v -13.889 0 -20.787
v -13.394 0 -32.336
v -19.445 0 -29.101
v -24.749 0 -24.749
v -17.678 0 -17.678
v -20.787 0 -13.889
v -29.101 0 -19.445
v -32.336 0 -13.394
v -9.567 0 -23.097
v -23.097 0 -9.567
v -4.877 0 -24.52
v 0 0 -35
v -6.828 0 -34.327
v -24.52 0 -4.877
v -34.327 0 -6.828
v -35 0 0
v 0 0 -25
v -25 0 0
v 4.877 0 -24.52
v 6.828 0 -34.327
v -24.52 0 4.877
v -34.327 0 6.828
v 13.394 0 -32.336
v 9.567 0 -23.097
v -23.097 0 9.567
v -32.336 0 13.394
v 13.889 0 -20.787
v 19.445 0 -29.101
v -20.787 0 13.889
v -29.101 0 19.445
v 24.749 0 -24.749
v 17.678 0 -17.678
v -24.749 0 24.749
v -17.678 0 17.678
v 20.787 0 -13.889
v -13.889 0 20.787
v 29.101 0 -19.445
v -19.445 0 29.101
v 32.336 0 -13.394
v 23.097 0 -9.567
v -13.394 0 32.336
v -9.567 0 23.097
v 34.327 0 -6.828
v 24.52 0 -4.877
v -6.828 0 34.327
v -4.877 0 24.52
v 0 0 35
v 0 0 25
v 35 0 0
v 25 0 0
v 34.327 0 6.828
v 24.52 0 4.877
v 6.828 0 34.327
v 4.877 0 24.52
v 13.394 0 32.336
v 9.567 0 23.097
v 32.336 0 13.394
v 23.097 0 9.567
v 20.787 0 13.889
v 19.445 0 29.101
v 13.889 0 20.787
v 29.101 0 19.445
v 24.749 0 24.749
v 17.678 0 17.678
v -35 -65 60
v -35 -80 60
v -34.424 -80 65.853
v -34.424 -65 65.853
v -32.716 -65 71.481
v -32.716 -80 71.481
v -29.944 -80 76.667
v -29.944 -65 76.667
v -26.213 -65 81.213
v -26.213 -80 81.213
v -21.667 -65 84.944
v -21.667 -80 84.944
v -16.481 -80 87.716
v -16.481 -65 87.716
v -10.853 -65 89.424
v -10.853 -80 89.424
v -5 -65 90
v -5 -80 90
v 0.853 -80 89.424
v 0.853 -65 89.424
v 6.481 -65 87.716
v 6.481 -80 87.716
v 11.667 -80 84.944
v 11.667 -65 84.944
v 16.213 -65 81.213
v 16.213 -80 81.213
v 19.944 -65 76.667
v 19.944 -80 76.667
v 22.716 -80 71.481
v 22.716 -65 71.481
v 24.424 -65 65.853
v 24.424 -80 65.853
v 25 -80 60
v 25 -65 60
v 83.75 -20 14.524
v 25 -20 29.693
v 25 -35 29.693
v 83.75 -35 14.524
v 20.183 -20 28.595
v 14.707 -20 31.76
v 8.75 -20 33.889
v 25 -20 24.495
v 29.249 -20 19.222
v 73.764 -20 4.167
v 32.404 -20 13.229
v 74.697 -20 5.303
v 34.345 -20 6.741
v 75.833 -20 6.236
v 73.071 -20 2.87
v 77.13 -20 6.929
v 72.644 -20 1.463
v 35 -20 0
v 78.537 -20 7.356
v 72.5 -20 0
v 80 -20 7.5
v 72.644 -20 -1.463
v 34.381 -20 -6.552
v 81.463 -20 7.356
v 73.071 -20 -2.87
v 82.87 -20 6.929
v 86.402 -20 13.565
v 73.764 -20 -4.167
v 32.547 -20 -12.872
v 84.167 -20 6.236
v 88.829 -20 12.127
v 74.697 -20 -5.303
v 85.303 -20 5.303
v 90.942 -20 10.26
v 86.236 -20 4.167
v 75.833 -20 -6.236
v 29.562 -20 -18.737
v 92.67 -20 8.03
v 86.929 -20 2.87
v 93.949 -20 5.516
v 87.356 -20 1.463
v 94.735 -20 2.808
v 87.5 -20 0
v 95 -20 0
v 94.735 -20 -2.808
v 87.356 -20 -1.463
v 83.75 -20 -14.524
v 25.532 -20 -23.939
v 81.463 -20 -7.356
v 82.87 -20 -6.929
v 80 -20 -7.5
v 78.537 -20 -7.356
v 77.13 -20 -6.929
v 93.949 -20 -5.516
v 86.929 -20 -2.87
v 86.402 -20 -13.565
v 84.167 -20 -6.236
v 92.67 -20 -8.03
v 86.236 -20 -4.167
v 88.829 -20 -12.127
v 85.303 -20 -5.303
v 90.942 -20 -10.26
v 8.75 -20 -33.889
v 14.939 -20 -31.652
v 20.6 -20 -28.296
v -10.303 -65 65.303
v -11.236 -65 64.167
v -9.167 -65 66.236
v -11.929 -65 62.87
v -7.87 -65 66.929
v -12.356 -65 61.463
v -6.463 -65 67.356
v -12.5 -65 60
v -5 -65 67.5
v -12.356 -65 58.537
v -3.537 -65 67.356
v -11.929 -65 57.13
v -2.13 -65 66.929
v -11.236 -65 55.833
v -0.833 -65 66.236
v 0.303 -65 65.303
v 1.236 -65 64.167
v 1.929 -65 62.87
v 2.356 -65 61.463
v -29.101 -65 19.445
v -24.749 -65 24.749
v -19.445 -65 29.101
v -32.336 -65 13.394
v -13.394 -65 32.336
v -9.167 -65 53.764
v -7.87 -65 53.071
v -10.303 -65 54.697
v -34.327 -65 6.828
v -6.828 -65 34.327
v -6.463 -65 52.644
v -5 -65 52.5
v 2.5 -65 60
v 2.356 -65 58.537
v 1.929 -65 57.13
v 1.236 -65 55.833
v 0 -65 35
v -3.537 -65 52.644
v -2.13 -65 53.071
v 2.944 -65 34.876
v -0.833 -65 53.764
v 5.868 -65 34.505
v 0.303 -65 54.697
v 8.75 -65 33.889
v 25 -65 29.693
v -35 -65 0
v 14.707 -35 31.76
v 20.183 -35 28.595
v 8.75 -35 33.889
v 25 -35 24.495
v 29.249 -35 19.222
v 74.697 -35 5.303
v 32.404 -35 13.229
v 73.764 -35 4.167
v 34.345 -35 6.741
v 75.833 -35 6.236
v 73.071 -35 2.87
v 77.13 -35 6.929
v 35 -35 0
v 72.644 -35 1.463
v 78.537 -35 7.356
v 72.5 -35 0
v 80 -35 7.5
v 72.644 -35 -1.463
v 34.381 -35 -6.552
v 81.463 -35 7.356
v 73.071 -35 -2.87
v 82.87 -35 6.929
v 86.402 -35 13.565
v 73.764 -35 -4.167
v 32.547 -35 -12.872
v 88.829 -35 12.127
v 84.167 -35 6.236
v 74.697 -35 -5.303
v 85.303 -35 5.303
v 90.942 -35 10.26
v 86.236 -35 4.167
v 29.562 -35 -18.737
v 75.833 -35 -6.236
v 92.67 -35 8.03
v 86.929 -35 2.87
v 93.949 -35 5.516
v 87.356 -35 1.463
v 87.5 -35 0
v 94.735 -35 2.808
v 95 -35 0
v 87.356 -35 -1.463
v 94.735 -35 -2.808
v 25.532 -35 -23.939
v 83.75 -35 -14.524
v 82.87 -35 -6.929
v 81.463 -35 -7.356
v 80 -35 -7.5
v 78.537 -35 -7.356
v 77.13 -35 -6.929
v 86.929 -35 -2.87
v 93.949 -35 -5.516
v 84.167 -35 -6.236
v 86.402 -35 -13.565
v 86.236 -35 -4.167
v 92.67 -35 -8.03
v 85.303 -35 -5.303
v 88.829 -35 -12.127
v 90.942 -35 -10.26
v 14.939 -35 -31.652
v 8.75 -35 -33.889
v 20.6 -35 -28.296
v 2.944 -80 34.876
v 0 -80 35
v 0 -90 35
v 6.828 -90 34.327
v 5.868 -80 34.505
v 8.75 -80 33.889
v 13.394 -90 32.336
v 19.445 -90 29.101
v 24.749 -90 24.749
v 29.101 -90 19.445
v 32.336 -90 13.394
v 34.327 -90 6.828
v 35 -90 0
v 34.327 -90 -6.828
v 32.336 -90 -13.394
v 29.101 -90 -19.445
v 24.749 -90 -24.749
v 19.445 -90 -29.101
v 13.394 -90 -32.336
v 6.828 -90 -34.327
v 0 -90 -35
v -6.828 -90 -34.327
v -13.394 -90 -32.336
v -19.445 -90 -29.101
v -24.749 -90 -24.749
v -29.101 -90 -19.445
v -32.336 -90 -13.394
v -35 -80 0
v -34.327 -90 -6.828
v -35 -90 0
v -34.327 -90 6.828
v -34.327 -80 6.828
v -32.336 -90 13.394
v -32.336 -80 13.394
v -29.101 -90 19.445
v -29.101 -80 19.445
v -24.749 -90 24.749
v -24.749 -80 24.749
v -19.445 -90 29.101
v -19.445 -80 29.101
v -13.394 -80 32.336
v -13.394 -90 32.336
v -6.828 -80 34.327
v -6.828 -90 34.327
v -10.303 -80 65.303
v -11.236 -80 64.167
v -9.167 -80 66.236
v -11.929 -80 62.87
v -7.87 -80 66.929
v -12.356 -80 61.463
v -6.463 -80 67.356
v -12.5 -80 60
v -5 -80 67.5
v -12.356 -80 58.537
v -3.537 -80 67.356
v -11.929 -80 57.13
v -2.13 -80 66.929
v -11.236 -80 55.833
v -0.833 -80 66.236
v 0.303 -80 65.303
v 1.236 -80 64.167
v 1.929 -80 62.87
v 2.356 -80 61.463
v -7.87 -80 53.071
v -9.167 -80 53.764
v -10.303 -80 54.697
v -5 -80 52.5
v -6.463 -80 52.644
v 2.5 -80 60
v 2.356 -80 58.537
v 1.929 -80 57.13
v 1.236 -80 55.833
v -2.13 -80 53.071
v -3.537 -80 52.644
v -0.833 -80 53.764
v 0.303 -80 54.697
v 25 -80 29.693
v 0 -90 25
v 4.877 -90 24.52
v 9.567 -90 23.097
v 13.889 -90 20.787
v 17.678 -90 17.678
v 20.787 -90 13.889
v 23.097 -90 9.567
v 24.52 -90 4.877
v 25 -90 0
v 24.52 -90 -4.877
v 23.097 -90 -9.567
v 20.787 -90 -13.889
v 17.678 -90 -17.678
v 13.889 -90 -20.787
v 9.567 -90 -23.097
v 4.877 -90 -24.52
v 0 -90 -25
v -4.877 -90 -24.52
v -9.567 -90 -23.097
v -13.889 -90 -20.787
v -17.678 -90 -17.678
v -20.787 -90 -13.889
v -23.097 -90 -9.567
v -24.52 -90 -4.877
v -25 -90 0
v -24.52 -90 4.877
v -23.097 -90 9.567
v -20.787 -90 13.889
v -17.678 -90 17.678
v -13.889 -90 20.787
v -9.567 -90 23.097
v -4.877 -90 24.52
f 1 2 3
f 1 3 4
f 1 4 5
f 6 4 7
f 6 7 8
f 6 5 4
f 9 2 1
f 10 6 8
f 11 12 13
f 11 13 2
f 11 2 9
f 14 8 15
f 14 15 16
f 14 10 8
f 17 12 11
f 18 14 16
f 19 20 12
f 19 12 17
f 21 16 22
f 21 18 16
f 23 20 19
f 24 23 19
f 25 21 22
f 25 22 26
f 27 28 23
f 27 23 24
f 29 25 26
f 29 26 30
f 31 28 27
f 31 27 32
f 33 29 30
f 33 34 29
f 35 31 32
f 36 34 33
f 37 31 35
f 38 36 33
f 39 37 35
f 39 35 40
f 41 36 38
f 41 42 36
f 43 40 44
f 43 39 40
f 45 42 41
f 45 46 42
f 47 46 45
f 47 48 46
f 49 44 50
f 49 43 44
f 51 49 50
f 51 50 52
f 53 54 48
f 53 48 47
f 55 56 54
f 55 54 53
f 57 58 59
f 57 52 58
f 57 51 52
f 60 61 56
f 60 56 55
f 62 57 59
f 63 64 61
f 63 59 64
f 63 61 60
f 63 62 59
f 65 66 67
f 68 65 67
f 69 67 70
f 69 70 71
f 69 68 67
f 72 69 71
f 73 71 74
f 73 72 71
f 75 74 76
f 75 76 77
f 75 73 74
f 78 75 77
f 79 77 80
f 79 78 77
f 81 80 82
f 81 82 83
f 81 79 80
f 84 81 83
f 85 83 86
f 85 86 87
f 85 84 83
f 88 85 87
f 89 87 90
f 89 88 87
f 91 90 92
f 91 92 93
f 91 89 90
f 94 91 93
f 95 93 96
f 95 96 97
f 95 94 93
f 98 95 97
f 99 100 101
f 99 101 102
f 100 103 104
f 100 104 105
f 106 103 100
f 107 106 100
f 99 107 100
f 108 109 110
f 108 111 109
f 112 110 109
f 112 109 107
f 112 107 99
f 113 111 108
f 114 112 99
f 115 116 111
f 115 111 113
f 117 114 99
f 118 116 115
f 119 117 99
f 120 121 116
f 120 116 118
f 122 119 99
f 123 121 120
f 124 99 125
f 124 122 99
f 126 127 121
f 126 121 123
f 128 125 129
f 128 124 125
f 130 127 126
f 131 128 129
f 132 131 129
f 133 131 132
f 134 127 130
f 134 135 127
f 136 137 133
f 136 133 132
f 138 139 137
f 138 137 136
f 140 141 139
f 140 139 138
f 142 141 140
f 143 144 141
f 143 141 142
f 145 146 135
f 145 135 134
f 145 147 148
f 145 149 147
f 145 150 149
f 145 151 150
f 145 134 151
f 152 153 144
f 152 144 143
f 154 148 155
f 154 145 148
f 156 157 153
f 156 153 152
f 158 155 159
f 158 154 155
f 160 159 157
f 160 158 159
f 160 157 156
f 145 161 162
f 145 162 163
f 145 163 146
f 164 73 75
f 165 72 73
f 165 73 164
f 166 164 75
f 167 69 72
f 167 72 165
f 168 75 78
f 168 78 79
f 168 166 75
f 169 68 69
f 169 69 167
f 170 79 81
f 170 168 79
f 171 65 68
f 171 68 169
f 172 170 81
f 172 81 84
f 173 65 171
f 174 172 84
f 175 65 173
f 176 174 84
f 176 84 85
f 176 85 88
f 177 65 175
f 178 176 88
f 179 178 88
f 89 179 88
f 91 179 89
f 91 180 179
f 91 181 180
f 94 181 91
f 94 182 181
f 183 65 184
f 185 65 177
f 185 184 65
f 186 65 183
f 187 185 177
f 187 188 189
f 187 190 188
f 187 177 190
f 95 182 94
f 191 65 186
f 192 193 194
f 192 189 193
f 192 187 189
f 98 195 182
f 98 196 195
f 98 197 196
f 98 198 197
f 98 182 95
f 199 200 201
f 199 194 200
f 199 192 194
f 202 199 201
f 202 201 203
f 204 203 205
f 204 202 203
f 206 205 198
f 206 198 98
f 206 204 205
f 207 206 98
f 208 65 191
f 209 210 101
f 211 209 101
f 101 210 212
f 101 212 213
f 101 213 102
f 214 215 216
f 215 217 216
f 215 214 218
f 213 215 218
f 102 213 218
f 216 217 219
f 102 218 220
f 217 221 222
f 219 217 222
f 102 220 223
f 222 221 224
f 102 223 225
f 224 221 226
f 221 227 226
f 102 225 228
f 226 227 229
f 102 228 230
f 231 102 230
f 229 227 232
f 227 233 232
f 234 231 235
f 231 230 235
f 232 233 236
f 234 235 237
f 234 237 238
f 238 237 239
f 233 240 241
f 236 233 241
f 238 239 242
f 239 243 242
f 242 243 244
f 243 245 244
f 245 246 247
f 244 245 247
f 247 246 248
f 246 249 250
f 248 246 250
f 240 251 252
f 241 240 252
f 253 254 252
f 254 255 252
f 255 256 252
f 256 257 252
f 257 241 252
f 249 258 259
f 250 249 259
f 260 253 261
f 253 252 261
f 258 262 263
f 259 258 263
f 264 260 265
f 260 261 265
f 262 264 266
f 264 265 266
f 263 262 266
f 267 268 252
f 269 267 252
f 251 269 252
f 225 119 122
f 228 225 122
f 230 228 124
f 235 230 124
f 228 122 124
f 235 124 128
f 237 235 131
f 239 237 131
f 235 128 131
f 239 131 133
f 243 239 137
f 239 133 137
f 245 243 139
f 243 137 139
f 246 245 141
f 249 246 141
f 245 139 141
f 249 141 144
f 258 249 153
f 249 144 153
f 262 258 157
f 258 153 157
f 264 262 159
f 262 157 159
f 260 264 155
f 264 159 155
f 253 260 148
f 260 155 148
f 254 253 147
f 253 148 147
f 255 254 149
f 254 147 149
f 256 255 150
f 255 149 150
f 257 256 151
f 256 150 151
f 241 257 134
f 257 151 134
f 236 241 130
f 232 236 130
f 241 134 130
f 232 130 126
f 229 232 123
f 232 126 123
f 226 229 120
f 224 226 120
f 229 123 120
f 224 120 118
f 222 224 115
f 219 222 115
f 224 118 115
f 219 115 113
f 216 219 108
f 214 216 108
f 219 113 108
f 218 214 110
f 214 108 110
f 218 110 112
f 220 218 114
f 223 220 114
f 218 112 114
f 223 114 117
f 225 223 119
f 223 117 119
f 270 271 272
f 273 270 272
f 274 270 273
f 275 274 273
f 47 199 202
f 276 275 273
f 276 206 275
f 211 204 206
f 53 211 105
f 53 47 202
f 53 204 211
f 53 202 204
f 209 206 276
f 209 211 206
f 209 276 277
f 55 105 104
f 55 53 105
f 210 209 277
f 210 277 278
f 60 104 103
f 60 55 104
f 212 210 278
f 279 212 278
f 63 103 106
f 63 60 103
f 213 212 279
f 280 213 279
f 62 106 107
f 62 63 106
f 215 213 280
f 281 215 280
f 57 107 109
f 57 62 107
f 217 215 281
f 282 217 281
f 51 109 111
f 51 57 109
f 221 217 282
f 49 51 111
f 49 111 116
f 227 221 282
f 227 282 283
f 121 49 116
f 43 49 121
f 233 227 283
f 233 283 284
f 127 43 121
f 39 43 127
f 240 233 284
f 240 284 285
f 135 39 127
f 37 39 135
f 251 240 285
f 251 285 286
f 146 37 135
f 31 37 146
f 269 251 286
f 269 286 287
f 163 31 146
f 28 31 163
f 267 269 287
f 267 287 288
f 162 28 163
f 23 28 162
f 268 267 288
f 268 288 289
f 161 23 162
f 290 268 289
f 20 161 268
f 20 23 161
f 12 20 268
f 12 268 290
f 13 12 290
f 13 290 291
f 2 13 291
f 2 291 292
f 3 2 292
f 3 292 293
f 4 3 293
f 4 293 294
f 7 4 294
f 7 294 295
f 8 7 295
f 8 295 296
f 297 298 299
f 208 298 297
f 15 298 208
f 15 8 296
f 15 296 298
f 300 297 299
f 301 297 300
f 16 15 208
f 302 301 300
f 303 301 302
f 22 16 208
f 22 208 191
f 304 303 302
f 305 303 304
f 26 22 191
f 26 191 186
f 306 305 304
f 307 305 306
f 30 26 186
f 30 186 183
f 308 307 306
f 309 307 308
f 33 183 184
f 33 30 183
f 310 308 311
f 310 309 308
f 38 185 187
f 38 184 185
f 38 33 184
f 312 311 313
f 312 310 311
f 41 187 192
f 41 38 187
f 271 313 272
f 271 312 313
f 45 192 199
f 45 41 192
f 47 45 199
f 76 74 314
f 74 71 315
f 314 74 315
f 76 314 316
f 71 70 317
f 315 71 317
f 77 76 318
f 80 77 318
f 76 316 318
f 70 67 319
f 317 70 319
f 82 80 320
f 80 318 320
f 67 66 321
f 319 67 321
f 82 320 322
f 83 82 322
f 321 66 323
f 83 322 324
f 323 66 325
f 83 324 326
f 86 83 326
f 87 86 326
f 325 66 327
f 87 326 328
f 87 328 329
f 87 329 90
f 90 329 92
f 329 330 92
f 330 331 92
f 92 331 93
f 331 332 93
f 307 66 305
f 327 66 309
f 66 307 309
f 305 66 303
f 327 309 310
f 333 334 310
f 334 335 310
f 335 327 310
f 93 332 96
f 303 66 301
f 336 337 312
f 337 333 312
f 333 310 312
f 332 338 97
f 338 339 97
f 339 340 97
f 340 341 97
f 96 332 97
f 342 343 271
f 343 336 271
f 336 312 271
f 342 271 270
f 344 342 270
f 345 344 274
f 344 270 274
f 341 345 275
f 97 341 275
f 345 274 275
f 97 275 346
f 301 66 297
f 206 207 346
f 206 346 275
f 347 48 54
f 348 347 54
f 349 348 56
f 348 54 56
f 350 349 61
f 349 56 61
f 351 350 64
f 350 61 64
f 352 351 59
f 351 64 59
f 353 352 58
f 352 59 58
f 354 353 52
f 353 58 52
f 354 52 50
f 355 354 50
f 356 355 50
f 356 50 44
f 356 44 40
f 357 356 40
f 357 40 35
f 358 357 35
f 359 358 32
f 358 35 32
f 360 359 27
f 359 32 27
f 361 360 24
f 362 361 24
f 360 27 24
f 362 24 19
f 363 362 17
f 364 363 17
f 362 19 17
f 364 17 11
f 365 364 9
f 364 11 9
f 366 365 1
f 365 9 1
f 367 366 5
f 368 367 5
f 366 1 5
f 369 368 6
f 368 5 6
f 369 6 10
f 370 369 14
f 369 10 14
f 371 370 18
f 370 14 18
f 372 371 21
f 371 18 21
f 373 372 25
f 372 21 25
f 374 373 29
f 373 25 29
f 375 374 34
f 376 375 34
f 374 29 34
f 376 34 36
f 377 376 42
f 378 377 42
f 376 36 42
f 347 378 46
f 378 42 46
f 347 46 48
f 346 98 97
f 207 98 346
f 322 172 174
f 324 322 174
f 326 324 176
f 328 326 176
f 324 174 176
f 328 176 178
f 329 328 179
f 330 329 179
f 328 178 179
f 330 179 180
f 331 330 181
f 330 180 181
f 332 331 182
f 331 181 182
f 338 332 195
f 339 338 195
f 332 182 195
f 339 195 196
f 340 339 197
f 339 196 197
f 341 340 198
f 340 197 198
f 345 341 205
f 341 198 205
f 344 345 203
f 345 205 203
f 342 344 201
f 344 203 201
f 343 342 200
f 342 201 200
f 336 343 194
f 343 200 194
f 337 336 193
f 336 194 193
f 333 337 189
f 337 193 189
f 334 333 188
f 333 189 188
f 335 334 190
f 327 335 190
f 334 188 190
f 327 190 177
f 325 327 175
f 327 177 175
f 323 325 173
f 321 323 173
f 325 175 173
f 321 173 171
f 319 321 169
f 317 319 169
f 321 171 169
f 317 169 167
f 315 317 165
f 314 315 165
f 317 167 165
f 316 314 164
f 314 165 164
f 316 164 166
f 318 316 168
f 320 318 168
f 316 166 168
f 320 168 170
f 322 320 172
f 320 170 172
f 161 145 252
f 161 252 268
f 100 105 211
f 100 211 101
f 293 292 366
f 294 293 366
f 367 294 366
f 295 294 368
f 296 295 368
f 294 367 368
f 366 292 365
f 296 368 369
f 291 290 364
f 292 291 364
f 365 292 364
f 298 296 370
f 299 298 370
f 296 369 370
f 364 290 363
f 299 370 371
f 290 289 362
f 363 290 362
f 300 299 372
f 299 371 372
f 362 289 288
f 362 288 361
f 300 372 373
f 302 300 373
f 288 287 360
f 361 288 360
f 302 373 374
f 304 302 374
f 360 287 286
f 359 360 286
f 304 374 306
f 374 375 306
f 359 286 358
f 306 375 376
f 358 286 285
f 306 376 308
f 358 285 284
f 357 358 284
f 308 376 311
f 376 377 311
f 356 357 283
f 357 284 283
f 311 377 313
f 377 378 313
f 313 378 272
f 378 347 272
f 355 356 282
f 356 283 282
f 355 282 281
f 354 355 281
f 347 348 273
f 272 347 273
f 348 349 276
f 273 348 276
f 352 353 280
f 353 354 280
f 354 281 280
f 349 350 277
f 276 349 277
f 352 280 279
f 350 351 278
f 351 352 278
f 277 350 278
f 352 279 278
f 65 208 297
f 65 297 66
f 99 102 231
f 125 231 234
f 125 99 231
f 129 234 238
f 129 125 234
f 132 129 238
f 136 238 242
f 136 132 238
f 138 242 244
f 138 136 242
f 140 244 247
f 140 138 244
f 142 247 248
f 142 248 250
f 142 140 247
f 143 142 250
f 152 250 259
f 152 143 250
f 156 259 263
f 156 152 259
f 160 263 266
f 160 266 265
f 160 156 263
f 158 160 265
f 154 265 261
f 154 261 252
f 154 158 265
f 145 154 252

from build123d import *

# Parameters (mm, degrees)
SKETCH1_R           = 25
BOSS_EXTRUDE1_DEPTH = 90
BOSS_EXTRUDE2_START = -20
SKETCH1_3_R         = 7.5
BOSS_EXTRUDE2_DEPTH = 15
BOSS_EXTRUDE3_START = -65
SKETCH1_4_R         = 7.5
BOSS_EXTRUDE3_DEPTH = 15


with BuildPart() as part:
    # Sketch1 → Boss-Extrude1 (new body)
    with BuildSketch(Plane(origin=(0, 0, 0), x_dir=(1, 0, 0), z_dir=(0, 1, 0))):
        with BuildLine():
            ThreePointArc((8.75, -33.888604279), (17.516451042, -30.301385165), (25, -24.494897428))
            ThreePointArc((25, -24.494897428), (32.403703492, -13.228756555), (35, 0))
            ThreePointArc((35, 0), (27.669929526, 21.433035249), (8.75, 33.888604279))
            ThreePointArc((8.75, 33.888604279), (-21.433035249, 27.669929526), (-35, 0))
            ThreePointArc((-35, 0), (-21.433035249, -27.669929526), (8.75, -33.888604279))
        make_face()
        Circle(SKETCH1_R, mode=Mode.SUBTRACT)
    extrude(amount=-BOSS_EXTRUDE1_DEPTH)

    # Sketch1<3> → Boss-Extrude2 (add)
    with BuildSketch(Plane(origin=(0, 0, 0), x_dir=(1, 0, 0), z_dir=(0, 1, 0)).offset(BOSS_EXTRUDE2_START)):
        with BuildLine():
            Line((8.75, -33.888604279), (83.75, -14.523687548))
            ThreePointArc((83.75, -14.523687548), (95, 0), (83.75, 14.523687548))
            Line((83.75, 14.523687548), (8.75, 33.888604279))
            ThreePointArc((8.75, 33.888604279), (35, 0), (8.75, -33.888604279))
        make_face()
        with Locations((80, 0)):
            Circle(SKETCH1_3_R, mode=Mode.SUBTRACT)
    extrude(amount=-BOSS_EXTRUDE2_DEPTH)

    # Sketch1<4> → Boss-Extrude3 (add)
    with BuildSketch(Plane(origin=(0, 0, 0), x_dir=(1, 0, 0), z_dir=(0, 1, 0)).offset(BOSS_EXTRUDE3_START)):
        with BuildLine():
            ThreePointArc((-35, -60), (-5, -90), (25, -60))
            Line((25, -60), (25, -29.692872321))
            Line((25, -29.692872321), (8.75, -33.888604279))
            ThreePointArc((8.75, -33.888604279), (-21.433035249, -27.669929526), (-35, 0))
            Line((-35, 0), (-35, -60))
        make_face()
        with Locations((-5, -60)):
            Circle(SKETCH1_4_R, mode=Mode.SUBTRACT)
    extrude(amount=-BOSS_EXTRUDE3_DEPTH)


solid = part.part
